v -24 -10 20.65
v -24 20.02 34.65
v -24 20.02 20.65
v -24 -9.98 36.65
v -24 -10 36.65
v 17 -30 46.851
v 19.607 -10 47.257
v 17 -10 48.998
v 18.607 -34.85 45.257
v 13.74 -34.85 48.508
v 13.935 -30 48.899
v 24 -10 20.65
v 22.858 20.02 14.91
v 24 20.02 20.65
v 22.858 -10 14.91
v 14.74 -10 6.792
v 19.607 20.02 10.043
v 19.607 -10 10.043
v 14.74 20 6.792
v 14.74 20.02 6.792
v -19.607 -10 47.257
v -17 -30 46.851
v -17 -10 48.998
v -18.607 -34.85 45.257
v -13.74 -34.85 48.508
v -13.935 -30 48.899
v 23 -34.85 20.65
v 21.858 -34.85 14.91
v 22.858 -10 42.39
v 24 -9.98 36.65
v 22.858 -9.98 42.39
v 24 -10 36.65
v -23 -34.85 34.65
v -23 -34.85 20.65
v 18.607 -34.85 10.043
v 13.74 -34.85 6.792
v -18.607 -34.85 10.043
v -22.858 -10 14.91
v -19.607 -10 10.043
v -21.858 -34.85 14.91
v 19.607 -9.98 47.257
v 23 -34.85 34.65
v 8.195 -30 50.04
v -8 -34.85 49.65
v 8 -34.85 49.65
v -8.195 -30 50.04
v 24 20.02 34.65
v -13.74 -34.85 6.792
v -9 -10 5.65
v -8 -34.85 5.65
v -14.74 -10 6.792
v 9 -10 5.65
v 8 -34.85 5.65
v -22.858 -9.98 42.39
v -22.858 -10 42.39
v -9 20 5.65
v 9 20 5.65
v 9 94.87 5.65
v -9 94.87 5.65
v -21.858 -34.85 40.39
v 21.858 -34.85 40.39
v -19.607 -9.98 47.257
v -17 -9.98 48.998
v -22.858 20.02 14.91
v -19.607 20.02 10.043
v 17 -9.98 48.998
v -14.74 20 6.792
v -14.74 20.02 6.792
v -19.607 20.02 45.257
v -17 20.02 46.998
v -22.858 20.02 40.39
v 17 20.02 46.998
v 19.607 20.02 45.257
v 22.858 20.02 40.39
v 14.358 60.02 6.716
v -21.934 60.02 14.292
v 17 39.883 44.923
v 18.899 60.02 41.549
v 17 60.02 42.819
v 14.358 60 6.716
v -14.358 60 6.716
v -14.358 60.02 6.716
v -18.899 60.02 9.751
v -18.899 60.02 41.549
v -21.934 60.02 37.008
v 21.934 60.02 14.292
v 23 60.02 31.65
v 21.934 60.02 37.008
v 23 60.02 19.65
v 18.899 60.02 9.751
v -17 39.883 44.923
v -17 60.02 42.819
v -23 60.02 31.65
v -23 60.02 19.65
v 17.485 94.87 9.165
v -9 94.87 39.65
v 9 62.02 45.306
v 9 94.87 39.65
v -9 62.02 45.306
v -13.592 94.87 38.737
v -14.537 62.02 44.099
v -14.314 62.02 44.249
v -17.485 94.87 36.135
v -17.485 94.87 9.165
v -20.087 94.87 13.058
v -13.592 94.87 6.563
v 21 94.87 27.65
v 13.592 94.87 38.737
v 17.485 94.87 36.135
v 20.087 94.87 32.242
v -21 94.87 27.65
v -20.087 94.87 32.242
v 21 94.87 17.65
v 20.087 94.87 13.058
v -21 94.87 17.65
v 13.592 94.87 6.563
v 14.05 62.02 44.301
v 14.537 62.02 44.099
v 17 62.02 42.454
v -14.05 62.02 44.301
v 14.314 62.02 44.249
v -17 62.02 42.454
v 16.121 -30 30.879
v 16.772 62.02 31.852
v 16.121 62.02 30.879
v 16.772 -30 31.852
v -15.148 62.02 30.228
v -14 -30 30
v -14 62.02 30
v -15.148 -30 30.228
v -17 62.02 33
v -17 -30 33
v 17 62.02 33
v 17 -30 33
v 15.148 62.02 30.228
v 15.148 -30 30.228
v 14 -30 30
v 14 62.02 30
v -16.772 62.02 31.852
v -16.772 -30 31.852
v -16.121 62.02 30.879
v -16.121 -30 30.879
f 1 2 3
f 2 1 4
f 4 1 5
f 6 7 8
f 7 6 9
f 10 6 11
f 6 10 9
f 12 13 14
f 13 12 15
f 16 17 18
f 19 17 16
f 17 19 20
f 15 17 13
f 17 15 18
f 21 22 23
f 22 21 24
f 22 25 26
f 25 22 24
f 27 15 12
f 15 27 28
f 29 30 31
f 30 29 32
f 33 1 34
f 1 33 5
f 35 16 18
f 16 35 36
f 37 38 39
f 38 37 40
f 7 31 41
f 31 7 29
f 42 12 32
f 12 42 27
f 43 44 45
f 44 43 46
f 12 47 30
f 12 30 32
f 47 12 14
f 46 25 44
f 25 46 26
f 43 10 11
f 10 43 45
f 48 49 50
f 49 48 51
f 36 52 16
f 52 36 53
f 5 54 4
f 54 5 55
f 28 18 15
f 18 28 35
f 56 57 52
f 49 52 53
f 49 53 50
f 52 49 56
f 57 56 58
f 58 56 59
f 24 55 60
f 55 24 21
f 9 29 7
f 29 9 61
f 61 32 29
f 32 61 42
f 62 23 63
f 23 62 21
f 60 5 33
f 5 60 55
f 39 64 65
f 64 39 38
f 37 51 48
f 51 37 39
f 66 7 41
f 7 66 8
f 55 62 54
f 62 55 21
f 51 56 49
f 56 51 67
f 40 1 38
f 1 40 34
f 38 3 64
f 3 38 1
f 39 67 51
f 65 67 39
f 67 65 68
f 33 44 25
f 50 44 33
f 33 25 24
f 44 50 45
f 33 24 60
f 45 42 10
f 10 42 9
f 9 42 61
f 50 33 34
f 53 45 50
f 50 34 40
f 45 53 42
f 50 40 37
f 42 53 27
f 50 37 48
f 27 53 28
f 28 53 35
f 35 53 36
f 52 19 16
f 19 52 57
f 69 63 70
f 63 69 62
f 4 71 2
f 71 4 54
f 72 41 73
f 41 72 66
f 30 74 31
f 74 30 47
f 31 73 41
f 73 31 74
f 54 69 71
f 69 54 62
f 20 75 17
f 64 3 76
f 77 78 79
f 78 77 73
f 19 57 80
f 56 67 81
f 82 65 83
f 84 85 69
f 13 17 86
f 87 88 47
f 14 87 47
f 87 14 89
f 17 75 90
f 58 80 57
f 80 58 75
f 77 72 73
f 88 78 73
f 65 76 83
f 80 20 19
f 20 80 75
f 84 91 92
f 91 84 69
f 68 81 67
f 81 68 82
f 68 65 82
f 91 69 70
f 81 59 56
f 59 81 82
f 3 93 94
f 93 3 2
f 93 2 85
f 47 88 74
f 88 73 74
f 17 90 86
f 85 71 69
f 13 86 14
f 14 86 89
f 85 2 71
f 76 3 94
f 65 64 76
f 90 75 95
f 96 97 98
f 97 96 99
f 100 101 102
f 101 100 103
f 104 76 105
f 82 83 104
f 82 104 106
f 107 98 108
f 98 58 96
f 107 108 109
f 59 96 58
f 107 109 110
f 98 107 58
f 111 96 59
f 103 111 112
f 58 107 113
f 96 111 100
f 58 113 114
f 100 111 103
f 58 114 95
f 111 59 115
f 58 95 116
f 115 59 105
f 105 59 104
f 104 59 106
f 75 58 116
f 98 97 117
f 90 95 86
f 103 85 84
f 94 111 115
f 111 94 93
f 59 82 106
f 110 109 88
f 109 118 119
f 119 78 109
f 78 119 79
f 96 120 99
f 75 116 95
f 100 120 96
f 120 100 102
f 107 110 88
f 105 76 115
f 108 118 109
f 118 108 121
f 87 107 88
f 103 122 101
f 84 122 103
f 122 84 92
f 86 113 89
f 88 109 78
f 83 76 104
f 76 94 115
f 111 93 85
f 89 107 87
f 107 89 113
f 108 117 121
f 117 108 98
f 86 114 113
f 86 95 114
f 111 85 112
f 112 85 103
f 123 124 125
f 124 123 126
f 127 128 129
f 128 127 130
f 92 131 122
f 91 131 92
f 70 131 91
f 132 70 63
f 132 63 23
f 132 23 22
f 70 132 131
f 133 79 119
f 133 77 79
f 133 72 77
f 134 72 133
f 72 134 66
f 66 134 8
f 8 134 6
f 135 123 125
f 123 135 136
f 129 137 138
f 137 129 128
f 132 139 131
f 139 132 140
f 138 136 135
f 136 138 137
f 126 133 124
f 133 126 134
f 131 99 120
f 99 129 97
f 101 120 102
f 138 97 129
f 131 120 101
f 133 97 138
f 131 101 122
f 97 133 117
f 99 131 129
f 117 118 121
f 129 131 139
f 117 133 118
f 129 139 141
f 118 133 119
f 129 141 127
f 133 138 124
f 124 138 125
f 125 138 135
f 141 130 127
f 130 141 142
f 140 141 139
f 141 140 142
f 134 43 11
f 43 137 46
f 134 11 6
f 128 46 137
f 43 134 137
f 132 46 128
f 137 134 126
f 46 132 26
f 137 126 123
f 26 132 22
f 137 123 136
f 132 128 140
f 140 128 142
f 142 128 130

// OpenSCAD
// file: ../lib.scad
// ===== 공용 프리미티브 (params 의존 없음 — use로 포함. 함정 1) =====

// 두 점을 잇는 캡슐. 끝단이 od/2 만큼 뻗는다 (함정 3)
module rod(p1, p2, od, fn = 56)
    hull() { translate(p1) sphere(d = od, $fn = fn);
             translate(p2) sphere(d = od, $fn = fn); }

function mir(p, s = 1) = [s * p.x, p.y, p.z];

// --- 라운디드 사각 2D 폴리곤 (CCW) ---
function arc_pt(cx, cy, r, a) = [cx + r * cos(a), cy + r * sin(a)];
function rrpts(w, h, r, n = 4) =
    let (x = w / 2 - r, y = h / 2 - r)
    concat(
        [for (i = [0:n]) arc_pt( x, -y, r, -90 + 90 * i / n)],
        [for (i = [0:n]) arc_pt( x,  y, r,   0 + 90 * i / n)],
        [for (i = [0:n]) arc_pt(-x,  y, r,  90 + 90 * i / n)],
        [for (i = [0:n]) arc_pt(-x, -y, r, 180 + 90 * i / n)]);

// y 위치의 XZ 단면 슬래브 (중심 x0/zc, 폭 w/높이 h, 모서리 r).
// 회전 매핑: 2D x→차량 X, 2D y→차량 Z, 돌출 +z→−Y (y..y+0.02 전방 전용, 함정 20)
module slabr(y, x0, w, h, zc, r)
    translate([x0, y + 0.02, zc]) rotate([90, 0, 0])
        linear_extrude(0.02) polygon(rrpts(w, h, r));

// 단면 체인 loft: sec = [[y, x0, w, h, zc, r], ...]
module loftr(sec)
    for (i = [0 : len(sec) - 2])
        hull() {
            slabr(sec[i][0],     sec[i][1],     sec[i][2],     sec[i][3],     sec[i][4],     sec[i][5]);
            slabr(sec[i + 1][0], sec[i + 1][1], sec[i + 1][2], sec[i + 1][3], sec[i + 1][4], sec[i + 1][5]);
        }

// 라운디드 박스 (z0..z1 수직, 평면 모서리 r)
module rbox(xc, yc, z0, z1, dx, dy, r, fn = 32)
    hull() for (px = [-1, 1], py = [-1, 1])
        translate([xc + px * (dx / 2 - r), yc + py * (dy / 2 - r), z0])
            cylinder(r = r, h = z1 - z0, $fn = fn);

// --- NACA 계열 에어포일 (LE 원점, 2D +x = 현 방향) ---
function _yt(x, c, t) = 5 * t * c * (0.2969*sqrt(x) - 0.1260*x - 0.3516*x*x
    + 0.2843*x*x*x - 0.1036*x*x*x*x);
function _yc(x, c, m) = 4 * m * c * x * (1 - x);
function naca_pts(c, t, m, n = 12) =
    concat(
        [for (i = [0:n])     let (x = i / n)     [x*c,  _yt(x, c, t) + _yc(x, c, m)]],
        [for (i = [n-1:-1:0]) let (x = i / n)    [x*c, -_yt(x, c, t) + _yc(x, c, m)]]);

// 슬라이스 3D 링: v=[x, yle, zle, c, aoa, th, cam] → 받각 회전된 naca 점의 링
// (th/cam은 mm — 현 대비 비율로 정규화)
function wring(v, n = 12) =
    let (c = v[3], t = v[5] / c, m = v[6] / c, pts = naca_pts(c, t, m, n),
         ca = cos(v[4]), sa = sin(v[4]))
    // 코드 방향 (ca,sa) + 두께/캠버 수직 방향 (-sa,ca) — 2D y 누락 금지
    [for (p = pts) [v[0], v[1] + p[0] * ca - p[1] * sa, v[2] + p[0] * sa + p[1] * ca]];

// 진짜 로프트 윙 — polyhedron 스트립. hull 체인은 캠버진 하면을 볼록 껍질로
// 채워(LE→TE 직선 웨지) 요소가 처지므로 쓰지 않는다
module wing3(sl, n = 12) {
    rings = [for (v = sl) wring(v, n)];
    ns = len(rings);
    m = len(rings[0]);
    pts = [for (r = rings, p = r) p];
    function ix(i, k) = i * m + (k % m);
    faces = concat(
        // 측면 스트립 (사중면 → 삼각형 2) — 외향 노멀 권선(캡과 일치)
        [for (i = [0 : ns - 2], k = [0 : m - 1])
            each [[ix(i, k), ix(i, k + 1), ix(i + 1, k + 1)],
                  [ix(i, k), ix(i + 1, k + 1), ix(i + 1, k)]]],
        // 끝 캡 (링은 단순 폴리곤 — 팬 삼각분할)
        [for (k = [1 : m - 2]) [ix(0, 0), ix(0, k + 1), ix(0, k)]],
        [for (k = [1 : m - 2]) [ix(ns - 1, 0), ix(ns - 1, k), ix(ns - 1, k + 1)]]
    );
    polyhedron(points = pts, faces = faces, convexity = 4);
}

// 반쪽 슬라이스 → x-대칭 전체. 규약: half는 센터(x=0)→팁 순서(내림차순 x).
// 결과는 x 오름차순 체인. x=0 센터만 중복 제외 (그 외 전부 미러)
function wsym(half) =
    concat([for (i = [len(half) - 1 : -1 : 0]) half[i]],
           [for (i = [0 : len(half) - 1]) if (abs(half[i][0]) > 1e-9)
               concat([-half[i][0]], [for (j = [1 : len(half[i]) - 1]) half[i][j]])]);

// 환(링), 축 Z
module ann(r_in, r_out, h, fn = 96)
    difference() { cylinder(r = r_out, h = h, center = true, $fn = fn);
                   cylinder(r = r_in,  h = h + 2, center = true, $fn = fn); }

// 리스트 전체 x반전+순서 역행 (센터 구간 없는 플랩 등 — 좌우 별도 wing3 호출용).
// x반전만 하면 행렬식이 음수가 되어 권선이 뒤집힌다 → 순서 역행으로 상쇄
function msym(half) =
    [for (i = [len(half) - 1 : -1 : 0])
        concat([-half[i][0]], [for (j = [1 : len(half[i]) - 1]) half[i][j]])];
// file: ../params.scad
// =====================================================================
// F1 그랜드파이언스 카 1:10 — 전체 파라미터 (유일한 수정 지점)
// 좌표계: +Y 전방, +X 좌측, +Z 상방, 지면 z=0, 원점=휠베이스 중심
// 전장 558 (y -268..+278), 전폭 194, 휠베이스 360, 타이어 OD 72 (720mm)
// 30부품. loftr 단면 = [y, x0, w, h, zc, r] (XZ 단면, y..y+0.02 슬래브)
// wing3 슬라이스 = [x, yle, zle, c, aoa, th, cam]
//   aoa: 현 방향의 X축 회전각. 전방 받각 요소는 165~170 (TE가 뒤+위)
// =====================================================================
$fn = 96;

// -- 휠/액슬 (실차 720mm 타이어, 18인치 림, 트랙 F1600/R1550) --
AXF_Y = 180;   AXR_Y = -180;
WHF_X = 80;    WHR_X = 77.5;
WH_Z  = 36;
TIRF_W = 30.5; TIRR_W = 40.5;  TIR_R = 36;
TIR_FN = 288;                 // 타이어 회전체 해상도
RIM_R = 23.2;  RIM_T = 1.0;   // 림 배럴 반경/두께
RIM_LF = 12.4; RIM_LR = 17.4; // 림 배럴 반폭
HUB_BORE = 7.0; STUB_D = 6.2; // 방사 간극 0.4
DISC_R = 15.5;                // 브레이크 디스크

// -- 바디 공통 레벨 --
FLO_Z0 = 2.0;  FLO_Z1 = 5.5;  // 플로어 (두께 3.5)
BOD_Z0 = 5.65;                // 샤시/카버/기어박스 바닥 (플로어 위 0.15)
J = 0.15;                     // 부품 접합 기본 간극
ARM_OD = 3.4;                 // 서스펜션 암 캡슐 직경

// ===== 01 플로어 =====
FLOOR_SEC = [
    [132,    0,  92, 3.5, 3.75, 1.5], [100, 0, 118, 3.5, 3.75, 1.5],
    [60,     0, 130, 3.5, 3.75, 2.0], [10,  0, 132, 3.5, 3.75, 2.0],
    [-60,    0, 128, 3.5, 3.75, 2.0], [-120, 0, 112, 3.5, 3.75, 2.0],
    [-161.85, 0, 100, 3.5, 3.75, 2.0]];

// ===== 02 디퓨저 (램프 + 스트레이크는 부품 내부) =====
DIFF_SEC = [
    [-230,   0, 100, 10.0, 11.0, 1.5], [-215, 0, 100, 8.0,  9.0, 1.5],
    [-190,   0, 100,  6.0,  6.2, 1.5], [-162.0, 0, 100, 4.0, 4.15, 1.5]];
DIFF_TOP = [[-175, 7.8], [-205, 11.9], [-228, 15.6]];  // (y, 램프 상면 z)

// ===== 03 플로어 에지 윙 =====
FEW_SEC = [   // [y, x0, w, h, zc, r] — x0 부호로 좌우
    [55,   63.5, 3.0, 2.0, 6.65, 1.0], [-5,  65.5, 3.0, 5.5, 8.40, 1.5],
    [-70,  63.0, 3.0, 4.0, 7.65, 1.5], [-120, 58.0, 3.0, 3.0, 7.15, 1.5]];
FEW2_SEC = [
    [100, 57.0, 2.5, 1.5, 6.40, 0.8], [60, 60.0, 2.5, 2.0, 6.65, 0.8]];

// ===== 04 노우즈 =====
NOSE_SEC = [
    [95,   0, 38, 28, 25.3, 12], [100,  0, 38, 29, 25.3, 12],
    [115,  0, 36, 28, 23.8, 11], [135,  0, 31, 24, 21.3,  9],
    [160,  0, 27, 20, 18.3,  8], [185,  0, 23, 17, 15.8,  7],
    [205,  0, 20, 15, 14.3,  6], [224,  0, 17, 12, 12.3,  5],
    [242,  0, 14,  9, 10.8,  4], [258,  0, 10,  7, 10.1,  3],
    [272,  0,  4.5, 4.5, 9.8, 2], [273.5, 0, 1.2, 1.2, 9.8, 0.6]];

// ===== 05 샤시(모노코크) + 콕핏 컷 =====
CHAS_SEC = [
    [-34.85, 0, 46, 44, 27.65, 15], [-10, 0, 48, 46, 28.65, 15],
    [20,     0, 48, 44, 27.65, 15], [60,  0, 46, 40, 25.65, 14],
    [94.85,  0, 42, 34, 22.65, 12]];
CKP_CUT = [[62, 0, 34, 32, 46, 3], [-30, 0, 34, 30, 45, 3]];

// ===== 06 엔진 커버 + 샤크핀 =====
COV_SEC = [
    [-152,   0,  8, 14, 35.65,  6], [-140, 0, 12, 18, 32.65,  7],
    [-120,   0, 18, 24, 29.65,  9], [-95,  0, 26, 30, 26.15, 11],
    [-70,    0, 34, 36, 25.65, 13], [-50,  0, 40, 40, 25.65, 14],
    [-35.15, 0, 44, 42, 26.65, 15]];
FIN_SEC = [
    [-162, 0, 2.2, 44, 62.0, 1], [-120, 0, 2.5, 30, 56.0, 1],
    [-92.2, 0, 2.5, 10, 45.0, 1]];

// ===== 07 에어박스 (험프 + 인테이크 링) =====
ABX_SEC = [
    [-92, 0, 14, 17, 50.00, 6], [-68, 0, 20, 24, 56.60, 8],
    [-46, 0, 22, 26, 59.60, 8], [-34, 0, 22, 13, 56.30, 6]];
ABX_RING_C = [0, -45, 73.5];  ABX_RING_R = 11;  ABX_RING_T = 4.5;
ABX_RING_SZ = 0.72;

// ===== 08 사이드포드 (x0=±41.5) =====
SPOD_X0 = 41.5;
SPOD_SEC = [   // [y, w, h, zc, r]
    [38,   34, 26, 18.65, 8], [5,   34, 28, 19.65, 9], [-25,  34, 26, 18.65, 9],
    [-55,  32, 21, 18.15, 8], [-80, 30, 15, 17.15, 8], [-100, 26,  9, 16.15, 7]];
SPOD_INLET = [24, 18, 19, 2.3];  // 컷: w, h, zc, 깊이

// ===== 09 할로 =====
HALO_N = 28;  HALO_OD = 9;
HALO_RX = 22; HALO_RY = 44; HALO_CY = 12;  // 타원 계획면(평면도)
HALO_Z0 = 75; HALO_ZA = 2;                 // z(t) = Z0 + ZA*cos(t)

// ===== 10/11/12/13 프런트 윙 =====
FW_MAIN_HALF = [   // 반쪽(x≤0) — wsym()로 전체화
    [0,    258.3, 2.4, 20, 170, 1.4, 2.0],
    [-16,  259.0, 3.4, 27, 165, 1.6, 2.4],
    [-40,  260.0, 3.6, 40, 166, 1.8, 2.8],
    [-60,  257.0, 4.0, 37, 167, 1.7, 2.6],
    [-80,  258.0, 4.4, 31, 166, 1.6, 2.2],
    [-95.2, 263.0, 4.6, 26, 166, 1.5, 1.8]];
FW_F1_HALF = [
    [-16,  253.0, 8.0, 22, 155, 1.3, 4.0],
    [-40,  250.5, 8.2, 26, 156, 1.4, 4.2],
    [-60,  249.5, 8.4, 26, 157, 1.4, 4.2],
    [-80,  250.0, 8.6, 24, 158, 1.4, 4.0],
    [-95.2, 254.0, 8.8, 21, 158, 1.3, 3.5]];
FW_F2_HALF = [
    [-16,  258.0, 12.4, 17, 147, 1.2, 4.5],
    [-40,  255.5, 12.6, 20, 148, 1.3, 4.8],
    [-60,  254.5, 12.8, 20, 149, 1.3, 4.8],
    [-80,  254.5, 13.0, 19, 150, 1.3, 4.5],
    [-95.2, 258.0, 13.2, 17, 150, 1.2, 4.0]];
FW_EP_X = 96.3;  FW_EP_T = 1.5;   // 엔드플레이트 x 중심/두께
FW_EP_PTS = [    // (y,z) 아웃라인
    [226, 1.5], [266, 1.5], [266, 8], [263, 24.5], [252, 24.5],
    [244, 17], [233, 15], [226, 9]];
FW_MT_SEC = [   // 마운트 플레이트 [y, x0(±2.6), w, h, zc, r] — 노우즈 저면 라운딩 회피
    [244, 2.6, 1.6, 1.8, 5.25, 0.5], [250, 2.6, 1.6, 1.8, 5.25, 0.5]];

// ===== 14 리어 윙 =====
RW_MAIN = [
    [-50.8, -212, 57.5, 46, 162, 2.2, -3.5], [-25, -211, 56.6, 47, 162, 2.3, -4.0],
    [0,     -210, 54.2, 47, 162, 2.3, -4.0], [25,  -211, 56.6, 47, 162, 2.3, -4.0],
    [50.8,  -212, 57.5, 46, 162, 2.2, -3.5]];
RW_FLAP = [
    [-49.6, -234,   71.8, 30, 155, 1.8, -4.5],
    [0,     -235.5, 73.0, 30, 155, 1.8, -4.5],
    [49.6,  -234,   71.8, 30, 155, 1.8, -4.5]];
RW_EP_X = 52;  RW_EP_T = 2;
RW_EP_PTS = [
    [-200, 46], [-268, 46], [-268, 60], [-262, 93], [-250, 93],
    [-243, 72], [-218, 64], [-202, 74]];
RW_DRS = [-245, 79.4, 5.0, 2.6, 3.0];   // 팟: y, z, w, h, 두께

// ===== 15 빔 윙 =====
BEAM_E1 = [
    [-50.9, -204.5, 31.5, 16, 162, 1.8, -2.5], [0, -205.5, 30.4, 16, 162, 1.8, -2.5],
    [50.9,  -204.5, 31.5, 16, 162, 1.8, -2.5]];
BEAM_E2 = [
    [-50.9, -210, 36.8, 15, 158, 1.6, -3.0], [0, -211, 35.6, 15, 158, 1.6, -3.0],
    [50.9,  -210, 36.8, 15, 158, 1.6, -3.0]];
BEAM_PLATE = [-214, -200.15, 8.2, 22, 31];  // 마운트 플레이트 y1,y0,x반폭,z0,z1

// ===== 16 리어윙 파일론(쌍둥 스완넥) =====
RW_PYL = [[-158, 55.0], [-190, 58.0], [-212.5, 63.0]];  // (y, z), x=±5.4
RW_PYL_X = 5.4;  RW_PYL_OD = 8;

// ===== 17 미러 =====
MIR_BASE = [14, 63, 46.0];  MIR_HOUSE = [31, 66, 56.5];

// ===== 18 헬멧 =====
HELM_C = [0, 0, 55];  HELM_R = 11.5;
HELM_SC = [1, 1.18, 1.02];

// ===== 19 콕핏 트림 =====
SEAT_SEC  = [[30, 0, 26, 13.2, 36.75, 3], [-10, 0, 26, 13.2, 36.75, 3]];
HREST_SEC = [[12, 0, 32, 15, 53.5, 5], [-20, 0, 32, 15, 53.5, 5]];

// ===== 20 스티어링 휠 =====
SW_C = [0, 40, 47];  SW_TILT = 20;

// ===== 21/22 서스펜션 (픽업=[x, y, z], 암 끝은 업라이트 내부) =====
FUP = [61, 183, 46];  FLO_BALL = [61.5, 181, 24];  FTR = [61.5, 177, 35];
FPU = [61.5, 180, 27];
F_ARM = [   // [픽업, 볼]
    [[12.0, 206, 20.0], FUP],  [[16.0, 152, 23.0], FUP],
    [[11.9, 208,  9.3], FLO_BALL], [[16.3, 150, 12.0], FLO_BALL],
    [[15.6, 162, 14.0], FTR]];
F_PUSH = [[11.8, 198, 24.4], FPU];
RUP = [53.5, -182, 46];  RLO = [54, -179, 23];  RDRIVE_O = [52, -180, 31];
R_ARM = [
    [[13.3, -160, 47.0], RUP], [[13.3, -198, 45.0], RUP],
    [[12.8, -158, 20.4], RLO], [[9.2, -202, 19.6], RLO]];
R_PULL = [[12.6, -177, 23.75], [53.5, -181, 44]];
R_DRIVE = [[13.2, -180, 17.0], RDRIVE_O];

// ===== 23/24 브레이크 스쿱 =====
SCOOP_F = [[164.2, 59.5, 7, 11, 30, 3], [158, 58.5, 5.5, 8, 28.5, 2.5]];
SCOOP_R = [[-164.2, 48, 7, 10, 29, 3], [-158, 46, 5, 7.5, 27.5, 2.5]];

// ===== 25~28 타이어/림 =====
TIRE_BEAD = 2.6;   // 비드 안쪽 세팅 (단면 반경 23.4)

// ===== 29 기어박스 + 리어 크래시 =====
GEAR_SEC = [
    [-258,   0,  4,  1.8, 15.00, 1.5], [-252, 0,  6,  1.6, 16.30, 2],
    [-230,   0,  9,  1.4, 18.30, 3],   [-208, 0, 12,  4.9, 15.05, 4],
    [-195,   0, 16,  9.35, 14.83, 5],   [-170, 0, 20, 15.1, 15.45, 6],
    [-145,   0, 22, 15.95, 13.60, 7],  [-117.85, 0, 26, 8.6,  9.95, 8]];
GEAR_TOWER = [-200, -158, 8, 11.3, 28, 50];  // y1,y0,x내측,x외측,z0,z1
RAIN_LT = [-258.6, 5, 4];   // y면, w, h

// ===== 30 카메라/안테나 =====
TCAM_Y = -45;  TCAM_Z0 = 84.8;
SIDECAM = [[194, 19.0], [202, 18.5]];  // (y, z) — x는 노우즈 반폭+0.15
ANT = [[4, 70], [-4, 70]];             // (x, y) — chassis 탑
// main file
// 05 샤시(모노코크) — 콕핏 개구 컷 포함
include <../params.scad>
use <../lib.scad>

module chassis()
difference() {
    loftr(CHAS_SEC);
    loftr(CKP_CUT);   // 콕핏 트러프 (y -30..62, 개방 상면)
}

chassis();
